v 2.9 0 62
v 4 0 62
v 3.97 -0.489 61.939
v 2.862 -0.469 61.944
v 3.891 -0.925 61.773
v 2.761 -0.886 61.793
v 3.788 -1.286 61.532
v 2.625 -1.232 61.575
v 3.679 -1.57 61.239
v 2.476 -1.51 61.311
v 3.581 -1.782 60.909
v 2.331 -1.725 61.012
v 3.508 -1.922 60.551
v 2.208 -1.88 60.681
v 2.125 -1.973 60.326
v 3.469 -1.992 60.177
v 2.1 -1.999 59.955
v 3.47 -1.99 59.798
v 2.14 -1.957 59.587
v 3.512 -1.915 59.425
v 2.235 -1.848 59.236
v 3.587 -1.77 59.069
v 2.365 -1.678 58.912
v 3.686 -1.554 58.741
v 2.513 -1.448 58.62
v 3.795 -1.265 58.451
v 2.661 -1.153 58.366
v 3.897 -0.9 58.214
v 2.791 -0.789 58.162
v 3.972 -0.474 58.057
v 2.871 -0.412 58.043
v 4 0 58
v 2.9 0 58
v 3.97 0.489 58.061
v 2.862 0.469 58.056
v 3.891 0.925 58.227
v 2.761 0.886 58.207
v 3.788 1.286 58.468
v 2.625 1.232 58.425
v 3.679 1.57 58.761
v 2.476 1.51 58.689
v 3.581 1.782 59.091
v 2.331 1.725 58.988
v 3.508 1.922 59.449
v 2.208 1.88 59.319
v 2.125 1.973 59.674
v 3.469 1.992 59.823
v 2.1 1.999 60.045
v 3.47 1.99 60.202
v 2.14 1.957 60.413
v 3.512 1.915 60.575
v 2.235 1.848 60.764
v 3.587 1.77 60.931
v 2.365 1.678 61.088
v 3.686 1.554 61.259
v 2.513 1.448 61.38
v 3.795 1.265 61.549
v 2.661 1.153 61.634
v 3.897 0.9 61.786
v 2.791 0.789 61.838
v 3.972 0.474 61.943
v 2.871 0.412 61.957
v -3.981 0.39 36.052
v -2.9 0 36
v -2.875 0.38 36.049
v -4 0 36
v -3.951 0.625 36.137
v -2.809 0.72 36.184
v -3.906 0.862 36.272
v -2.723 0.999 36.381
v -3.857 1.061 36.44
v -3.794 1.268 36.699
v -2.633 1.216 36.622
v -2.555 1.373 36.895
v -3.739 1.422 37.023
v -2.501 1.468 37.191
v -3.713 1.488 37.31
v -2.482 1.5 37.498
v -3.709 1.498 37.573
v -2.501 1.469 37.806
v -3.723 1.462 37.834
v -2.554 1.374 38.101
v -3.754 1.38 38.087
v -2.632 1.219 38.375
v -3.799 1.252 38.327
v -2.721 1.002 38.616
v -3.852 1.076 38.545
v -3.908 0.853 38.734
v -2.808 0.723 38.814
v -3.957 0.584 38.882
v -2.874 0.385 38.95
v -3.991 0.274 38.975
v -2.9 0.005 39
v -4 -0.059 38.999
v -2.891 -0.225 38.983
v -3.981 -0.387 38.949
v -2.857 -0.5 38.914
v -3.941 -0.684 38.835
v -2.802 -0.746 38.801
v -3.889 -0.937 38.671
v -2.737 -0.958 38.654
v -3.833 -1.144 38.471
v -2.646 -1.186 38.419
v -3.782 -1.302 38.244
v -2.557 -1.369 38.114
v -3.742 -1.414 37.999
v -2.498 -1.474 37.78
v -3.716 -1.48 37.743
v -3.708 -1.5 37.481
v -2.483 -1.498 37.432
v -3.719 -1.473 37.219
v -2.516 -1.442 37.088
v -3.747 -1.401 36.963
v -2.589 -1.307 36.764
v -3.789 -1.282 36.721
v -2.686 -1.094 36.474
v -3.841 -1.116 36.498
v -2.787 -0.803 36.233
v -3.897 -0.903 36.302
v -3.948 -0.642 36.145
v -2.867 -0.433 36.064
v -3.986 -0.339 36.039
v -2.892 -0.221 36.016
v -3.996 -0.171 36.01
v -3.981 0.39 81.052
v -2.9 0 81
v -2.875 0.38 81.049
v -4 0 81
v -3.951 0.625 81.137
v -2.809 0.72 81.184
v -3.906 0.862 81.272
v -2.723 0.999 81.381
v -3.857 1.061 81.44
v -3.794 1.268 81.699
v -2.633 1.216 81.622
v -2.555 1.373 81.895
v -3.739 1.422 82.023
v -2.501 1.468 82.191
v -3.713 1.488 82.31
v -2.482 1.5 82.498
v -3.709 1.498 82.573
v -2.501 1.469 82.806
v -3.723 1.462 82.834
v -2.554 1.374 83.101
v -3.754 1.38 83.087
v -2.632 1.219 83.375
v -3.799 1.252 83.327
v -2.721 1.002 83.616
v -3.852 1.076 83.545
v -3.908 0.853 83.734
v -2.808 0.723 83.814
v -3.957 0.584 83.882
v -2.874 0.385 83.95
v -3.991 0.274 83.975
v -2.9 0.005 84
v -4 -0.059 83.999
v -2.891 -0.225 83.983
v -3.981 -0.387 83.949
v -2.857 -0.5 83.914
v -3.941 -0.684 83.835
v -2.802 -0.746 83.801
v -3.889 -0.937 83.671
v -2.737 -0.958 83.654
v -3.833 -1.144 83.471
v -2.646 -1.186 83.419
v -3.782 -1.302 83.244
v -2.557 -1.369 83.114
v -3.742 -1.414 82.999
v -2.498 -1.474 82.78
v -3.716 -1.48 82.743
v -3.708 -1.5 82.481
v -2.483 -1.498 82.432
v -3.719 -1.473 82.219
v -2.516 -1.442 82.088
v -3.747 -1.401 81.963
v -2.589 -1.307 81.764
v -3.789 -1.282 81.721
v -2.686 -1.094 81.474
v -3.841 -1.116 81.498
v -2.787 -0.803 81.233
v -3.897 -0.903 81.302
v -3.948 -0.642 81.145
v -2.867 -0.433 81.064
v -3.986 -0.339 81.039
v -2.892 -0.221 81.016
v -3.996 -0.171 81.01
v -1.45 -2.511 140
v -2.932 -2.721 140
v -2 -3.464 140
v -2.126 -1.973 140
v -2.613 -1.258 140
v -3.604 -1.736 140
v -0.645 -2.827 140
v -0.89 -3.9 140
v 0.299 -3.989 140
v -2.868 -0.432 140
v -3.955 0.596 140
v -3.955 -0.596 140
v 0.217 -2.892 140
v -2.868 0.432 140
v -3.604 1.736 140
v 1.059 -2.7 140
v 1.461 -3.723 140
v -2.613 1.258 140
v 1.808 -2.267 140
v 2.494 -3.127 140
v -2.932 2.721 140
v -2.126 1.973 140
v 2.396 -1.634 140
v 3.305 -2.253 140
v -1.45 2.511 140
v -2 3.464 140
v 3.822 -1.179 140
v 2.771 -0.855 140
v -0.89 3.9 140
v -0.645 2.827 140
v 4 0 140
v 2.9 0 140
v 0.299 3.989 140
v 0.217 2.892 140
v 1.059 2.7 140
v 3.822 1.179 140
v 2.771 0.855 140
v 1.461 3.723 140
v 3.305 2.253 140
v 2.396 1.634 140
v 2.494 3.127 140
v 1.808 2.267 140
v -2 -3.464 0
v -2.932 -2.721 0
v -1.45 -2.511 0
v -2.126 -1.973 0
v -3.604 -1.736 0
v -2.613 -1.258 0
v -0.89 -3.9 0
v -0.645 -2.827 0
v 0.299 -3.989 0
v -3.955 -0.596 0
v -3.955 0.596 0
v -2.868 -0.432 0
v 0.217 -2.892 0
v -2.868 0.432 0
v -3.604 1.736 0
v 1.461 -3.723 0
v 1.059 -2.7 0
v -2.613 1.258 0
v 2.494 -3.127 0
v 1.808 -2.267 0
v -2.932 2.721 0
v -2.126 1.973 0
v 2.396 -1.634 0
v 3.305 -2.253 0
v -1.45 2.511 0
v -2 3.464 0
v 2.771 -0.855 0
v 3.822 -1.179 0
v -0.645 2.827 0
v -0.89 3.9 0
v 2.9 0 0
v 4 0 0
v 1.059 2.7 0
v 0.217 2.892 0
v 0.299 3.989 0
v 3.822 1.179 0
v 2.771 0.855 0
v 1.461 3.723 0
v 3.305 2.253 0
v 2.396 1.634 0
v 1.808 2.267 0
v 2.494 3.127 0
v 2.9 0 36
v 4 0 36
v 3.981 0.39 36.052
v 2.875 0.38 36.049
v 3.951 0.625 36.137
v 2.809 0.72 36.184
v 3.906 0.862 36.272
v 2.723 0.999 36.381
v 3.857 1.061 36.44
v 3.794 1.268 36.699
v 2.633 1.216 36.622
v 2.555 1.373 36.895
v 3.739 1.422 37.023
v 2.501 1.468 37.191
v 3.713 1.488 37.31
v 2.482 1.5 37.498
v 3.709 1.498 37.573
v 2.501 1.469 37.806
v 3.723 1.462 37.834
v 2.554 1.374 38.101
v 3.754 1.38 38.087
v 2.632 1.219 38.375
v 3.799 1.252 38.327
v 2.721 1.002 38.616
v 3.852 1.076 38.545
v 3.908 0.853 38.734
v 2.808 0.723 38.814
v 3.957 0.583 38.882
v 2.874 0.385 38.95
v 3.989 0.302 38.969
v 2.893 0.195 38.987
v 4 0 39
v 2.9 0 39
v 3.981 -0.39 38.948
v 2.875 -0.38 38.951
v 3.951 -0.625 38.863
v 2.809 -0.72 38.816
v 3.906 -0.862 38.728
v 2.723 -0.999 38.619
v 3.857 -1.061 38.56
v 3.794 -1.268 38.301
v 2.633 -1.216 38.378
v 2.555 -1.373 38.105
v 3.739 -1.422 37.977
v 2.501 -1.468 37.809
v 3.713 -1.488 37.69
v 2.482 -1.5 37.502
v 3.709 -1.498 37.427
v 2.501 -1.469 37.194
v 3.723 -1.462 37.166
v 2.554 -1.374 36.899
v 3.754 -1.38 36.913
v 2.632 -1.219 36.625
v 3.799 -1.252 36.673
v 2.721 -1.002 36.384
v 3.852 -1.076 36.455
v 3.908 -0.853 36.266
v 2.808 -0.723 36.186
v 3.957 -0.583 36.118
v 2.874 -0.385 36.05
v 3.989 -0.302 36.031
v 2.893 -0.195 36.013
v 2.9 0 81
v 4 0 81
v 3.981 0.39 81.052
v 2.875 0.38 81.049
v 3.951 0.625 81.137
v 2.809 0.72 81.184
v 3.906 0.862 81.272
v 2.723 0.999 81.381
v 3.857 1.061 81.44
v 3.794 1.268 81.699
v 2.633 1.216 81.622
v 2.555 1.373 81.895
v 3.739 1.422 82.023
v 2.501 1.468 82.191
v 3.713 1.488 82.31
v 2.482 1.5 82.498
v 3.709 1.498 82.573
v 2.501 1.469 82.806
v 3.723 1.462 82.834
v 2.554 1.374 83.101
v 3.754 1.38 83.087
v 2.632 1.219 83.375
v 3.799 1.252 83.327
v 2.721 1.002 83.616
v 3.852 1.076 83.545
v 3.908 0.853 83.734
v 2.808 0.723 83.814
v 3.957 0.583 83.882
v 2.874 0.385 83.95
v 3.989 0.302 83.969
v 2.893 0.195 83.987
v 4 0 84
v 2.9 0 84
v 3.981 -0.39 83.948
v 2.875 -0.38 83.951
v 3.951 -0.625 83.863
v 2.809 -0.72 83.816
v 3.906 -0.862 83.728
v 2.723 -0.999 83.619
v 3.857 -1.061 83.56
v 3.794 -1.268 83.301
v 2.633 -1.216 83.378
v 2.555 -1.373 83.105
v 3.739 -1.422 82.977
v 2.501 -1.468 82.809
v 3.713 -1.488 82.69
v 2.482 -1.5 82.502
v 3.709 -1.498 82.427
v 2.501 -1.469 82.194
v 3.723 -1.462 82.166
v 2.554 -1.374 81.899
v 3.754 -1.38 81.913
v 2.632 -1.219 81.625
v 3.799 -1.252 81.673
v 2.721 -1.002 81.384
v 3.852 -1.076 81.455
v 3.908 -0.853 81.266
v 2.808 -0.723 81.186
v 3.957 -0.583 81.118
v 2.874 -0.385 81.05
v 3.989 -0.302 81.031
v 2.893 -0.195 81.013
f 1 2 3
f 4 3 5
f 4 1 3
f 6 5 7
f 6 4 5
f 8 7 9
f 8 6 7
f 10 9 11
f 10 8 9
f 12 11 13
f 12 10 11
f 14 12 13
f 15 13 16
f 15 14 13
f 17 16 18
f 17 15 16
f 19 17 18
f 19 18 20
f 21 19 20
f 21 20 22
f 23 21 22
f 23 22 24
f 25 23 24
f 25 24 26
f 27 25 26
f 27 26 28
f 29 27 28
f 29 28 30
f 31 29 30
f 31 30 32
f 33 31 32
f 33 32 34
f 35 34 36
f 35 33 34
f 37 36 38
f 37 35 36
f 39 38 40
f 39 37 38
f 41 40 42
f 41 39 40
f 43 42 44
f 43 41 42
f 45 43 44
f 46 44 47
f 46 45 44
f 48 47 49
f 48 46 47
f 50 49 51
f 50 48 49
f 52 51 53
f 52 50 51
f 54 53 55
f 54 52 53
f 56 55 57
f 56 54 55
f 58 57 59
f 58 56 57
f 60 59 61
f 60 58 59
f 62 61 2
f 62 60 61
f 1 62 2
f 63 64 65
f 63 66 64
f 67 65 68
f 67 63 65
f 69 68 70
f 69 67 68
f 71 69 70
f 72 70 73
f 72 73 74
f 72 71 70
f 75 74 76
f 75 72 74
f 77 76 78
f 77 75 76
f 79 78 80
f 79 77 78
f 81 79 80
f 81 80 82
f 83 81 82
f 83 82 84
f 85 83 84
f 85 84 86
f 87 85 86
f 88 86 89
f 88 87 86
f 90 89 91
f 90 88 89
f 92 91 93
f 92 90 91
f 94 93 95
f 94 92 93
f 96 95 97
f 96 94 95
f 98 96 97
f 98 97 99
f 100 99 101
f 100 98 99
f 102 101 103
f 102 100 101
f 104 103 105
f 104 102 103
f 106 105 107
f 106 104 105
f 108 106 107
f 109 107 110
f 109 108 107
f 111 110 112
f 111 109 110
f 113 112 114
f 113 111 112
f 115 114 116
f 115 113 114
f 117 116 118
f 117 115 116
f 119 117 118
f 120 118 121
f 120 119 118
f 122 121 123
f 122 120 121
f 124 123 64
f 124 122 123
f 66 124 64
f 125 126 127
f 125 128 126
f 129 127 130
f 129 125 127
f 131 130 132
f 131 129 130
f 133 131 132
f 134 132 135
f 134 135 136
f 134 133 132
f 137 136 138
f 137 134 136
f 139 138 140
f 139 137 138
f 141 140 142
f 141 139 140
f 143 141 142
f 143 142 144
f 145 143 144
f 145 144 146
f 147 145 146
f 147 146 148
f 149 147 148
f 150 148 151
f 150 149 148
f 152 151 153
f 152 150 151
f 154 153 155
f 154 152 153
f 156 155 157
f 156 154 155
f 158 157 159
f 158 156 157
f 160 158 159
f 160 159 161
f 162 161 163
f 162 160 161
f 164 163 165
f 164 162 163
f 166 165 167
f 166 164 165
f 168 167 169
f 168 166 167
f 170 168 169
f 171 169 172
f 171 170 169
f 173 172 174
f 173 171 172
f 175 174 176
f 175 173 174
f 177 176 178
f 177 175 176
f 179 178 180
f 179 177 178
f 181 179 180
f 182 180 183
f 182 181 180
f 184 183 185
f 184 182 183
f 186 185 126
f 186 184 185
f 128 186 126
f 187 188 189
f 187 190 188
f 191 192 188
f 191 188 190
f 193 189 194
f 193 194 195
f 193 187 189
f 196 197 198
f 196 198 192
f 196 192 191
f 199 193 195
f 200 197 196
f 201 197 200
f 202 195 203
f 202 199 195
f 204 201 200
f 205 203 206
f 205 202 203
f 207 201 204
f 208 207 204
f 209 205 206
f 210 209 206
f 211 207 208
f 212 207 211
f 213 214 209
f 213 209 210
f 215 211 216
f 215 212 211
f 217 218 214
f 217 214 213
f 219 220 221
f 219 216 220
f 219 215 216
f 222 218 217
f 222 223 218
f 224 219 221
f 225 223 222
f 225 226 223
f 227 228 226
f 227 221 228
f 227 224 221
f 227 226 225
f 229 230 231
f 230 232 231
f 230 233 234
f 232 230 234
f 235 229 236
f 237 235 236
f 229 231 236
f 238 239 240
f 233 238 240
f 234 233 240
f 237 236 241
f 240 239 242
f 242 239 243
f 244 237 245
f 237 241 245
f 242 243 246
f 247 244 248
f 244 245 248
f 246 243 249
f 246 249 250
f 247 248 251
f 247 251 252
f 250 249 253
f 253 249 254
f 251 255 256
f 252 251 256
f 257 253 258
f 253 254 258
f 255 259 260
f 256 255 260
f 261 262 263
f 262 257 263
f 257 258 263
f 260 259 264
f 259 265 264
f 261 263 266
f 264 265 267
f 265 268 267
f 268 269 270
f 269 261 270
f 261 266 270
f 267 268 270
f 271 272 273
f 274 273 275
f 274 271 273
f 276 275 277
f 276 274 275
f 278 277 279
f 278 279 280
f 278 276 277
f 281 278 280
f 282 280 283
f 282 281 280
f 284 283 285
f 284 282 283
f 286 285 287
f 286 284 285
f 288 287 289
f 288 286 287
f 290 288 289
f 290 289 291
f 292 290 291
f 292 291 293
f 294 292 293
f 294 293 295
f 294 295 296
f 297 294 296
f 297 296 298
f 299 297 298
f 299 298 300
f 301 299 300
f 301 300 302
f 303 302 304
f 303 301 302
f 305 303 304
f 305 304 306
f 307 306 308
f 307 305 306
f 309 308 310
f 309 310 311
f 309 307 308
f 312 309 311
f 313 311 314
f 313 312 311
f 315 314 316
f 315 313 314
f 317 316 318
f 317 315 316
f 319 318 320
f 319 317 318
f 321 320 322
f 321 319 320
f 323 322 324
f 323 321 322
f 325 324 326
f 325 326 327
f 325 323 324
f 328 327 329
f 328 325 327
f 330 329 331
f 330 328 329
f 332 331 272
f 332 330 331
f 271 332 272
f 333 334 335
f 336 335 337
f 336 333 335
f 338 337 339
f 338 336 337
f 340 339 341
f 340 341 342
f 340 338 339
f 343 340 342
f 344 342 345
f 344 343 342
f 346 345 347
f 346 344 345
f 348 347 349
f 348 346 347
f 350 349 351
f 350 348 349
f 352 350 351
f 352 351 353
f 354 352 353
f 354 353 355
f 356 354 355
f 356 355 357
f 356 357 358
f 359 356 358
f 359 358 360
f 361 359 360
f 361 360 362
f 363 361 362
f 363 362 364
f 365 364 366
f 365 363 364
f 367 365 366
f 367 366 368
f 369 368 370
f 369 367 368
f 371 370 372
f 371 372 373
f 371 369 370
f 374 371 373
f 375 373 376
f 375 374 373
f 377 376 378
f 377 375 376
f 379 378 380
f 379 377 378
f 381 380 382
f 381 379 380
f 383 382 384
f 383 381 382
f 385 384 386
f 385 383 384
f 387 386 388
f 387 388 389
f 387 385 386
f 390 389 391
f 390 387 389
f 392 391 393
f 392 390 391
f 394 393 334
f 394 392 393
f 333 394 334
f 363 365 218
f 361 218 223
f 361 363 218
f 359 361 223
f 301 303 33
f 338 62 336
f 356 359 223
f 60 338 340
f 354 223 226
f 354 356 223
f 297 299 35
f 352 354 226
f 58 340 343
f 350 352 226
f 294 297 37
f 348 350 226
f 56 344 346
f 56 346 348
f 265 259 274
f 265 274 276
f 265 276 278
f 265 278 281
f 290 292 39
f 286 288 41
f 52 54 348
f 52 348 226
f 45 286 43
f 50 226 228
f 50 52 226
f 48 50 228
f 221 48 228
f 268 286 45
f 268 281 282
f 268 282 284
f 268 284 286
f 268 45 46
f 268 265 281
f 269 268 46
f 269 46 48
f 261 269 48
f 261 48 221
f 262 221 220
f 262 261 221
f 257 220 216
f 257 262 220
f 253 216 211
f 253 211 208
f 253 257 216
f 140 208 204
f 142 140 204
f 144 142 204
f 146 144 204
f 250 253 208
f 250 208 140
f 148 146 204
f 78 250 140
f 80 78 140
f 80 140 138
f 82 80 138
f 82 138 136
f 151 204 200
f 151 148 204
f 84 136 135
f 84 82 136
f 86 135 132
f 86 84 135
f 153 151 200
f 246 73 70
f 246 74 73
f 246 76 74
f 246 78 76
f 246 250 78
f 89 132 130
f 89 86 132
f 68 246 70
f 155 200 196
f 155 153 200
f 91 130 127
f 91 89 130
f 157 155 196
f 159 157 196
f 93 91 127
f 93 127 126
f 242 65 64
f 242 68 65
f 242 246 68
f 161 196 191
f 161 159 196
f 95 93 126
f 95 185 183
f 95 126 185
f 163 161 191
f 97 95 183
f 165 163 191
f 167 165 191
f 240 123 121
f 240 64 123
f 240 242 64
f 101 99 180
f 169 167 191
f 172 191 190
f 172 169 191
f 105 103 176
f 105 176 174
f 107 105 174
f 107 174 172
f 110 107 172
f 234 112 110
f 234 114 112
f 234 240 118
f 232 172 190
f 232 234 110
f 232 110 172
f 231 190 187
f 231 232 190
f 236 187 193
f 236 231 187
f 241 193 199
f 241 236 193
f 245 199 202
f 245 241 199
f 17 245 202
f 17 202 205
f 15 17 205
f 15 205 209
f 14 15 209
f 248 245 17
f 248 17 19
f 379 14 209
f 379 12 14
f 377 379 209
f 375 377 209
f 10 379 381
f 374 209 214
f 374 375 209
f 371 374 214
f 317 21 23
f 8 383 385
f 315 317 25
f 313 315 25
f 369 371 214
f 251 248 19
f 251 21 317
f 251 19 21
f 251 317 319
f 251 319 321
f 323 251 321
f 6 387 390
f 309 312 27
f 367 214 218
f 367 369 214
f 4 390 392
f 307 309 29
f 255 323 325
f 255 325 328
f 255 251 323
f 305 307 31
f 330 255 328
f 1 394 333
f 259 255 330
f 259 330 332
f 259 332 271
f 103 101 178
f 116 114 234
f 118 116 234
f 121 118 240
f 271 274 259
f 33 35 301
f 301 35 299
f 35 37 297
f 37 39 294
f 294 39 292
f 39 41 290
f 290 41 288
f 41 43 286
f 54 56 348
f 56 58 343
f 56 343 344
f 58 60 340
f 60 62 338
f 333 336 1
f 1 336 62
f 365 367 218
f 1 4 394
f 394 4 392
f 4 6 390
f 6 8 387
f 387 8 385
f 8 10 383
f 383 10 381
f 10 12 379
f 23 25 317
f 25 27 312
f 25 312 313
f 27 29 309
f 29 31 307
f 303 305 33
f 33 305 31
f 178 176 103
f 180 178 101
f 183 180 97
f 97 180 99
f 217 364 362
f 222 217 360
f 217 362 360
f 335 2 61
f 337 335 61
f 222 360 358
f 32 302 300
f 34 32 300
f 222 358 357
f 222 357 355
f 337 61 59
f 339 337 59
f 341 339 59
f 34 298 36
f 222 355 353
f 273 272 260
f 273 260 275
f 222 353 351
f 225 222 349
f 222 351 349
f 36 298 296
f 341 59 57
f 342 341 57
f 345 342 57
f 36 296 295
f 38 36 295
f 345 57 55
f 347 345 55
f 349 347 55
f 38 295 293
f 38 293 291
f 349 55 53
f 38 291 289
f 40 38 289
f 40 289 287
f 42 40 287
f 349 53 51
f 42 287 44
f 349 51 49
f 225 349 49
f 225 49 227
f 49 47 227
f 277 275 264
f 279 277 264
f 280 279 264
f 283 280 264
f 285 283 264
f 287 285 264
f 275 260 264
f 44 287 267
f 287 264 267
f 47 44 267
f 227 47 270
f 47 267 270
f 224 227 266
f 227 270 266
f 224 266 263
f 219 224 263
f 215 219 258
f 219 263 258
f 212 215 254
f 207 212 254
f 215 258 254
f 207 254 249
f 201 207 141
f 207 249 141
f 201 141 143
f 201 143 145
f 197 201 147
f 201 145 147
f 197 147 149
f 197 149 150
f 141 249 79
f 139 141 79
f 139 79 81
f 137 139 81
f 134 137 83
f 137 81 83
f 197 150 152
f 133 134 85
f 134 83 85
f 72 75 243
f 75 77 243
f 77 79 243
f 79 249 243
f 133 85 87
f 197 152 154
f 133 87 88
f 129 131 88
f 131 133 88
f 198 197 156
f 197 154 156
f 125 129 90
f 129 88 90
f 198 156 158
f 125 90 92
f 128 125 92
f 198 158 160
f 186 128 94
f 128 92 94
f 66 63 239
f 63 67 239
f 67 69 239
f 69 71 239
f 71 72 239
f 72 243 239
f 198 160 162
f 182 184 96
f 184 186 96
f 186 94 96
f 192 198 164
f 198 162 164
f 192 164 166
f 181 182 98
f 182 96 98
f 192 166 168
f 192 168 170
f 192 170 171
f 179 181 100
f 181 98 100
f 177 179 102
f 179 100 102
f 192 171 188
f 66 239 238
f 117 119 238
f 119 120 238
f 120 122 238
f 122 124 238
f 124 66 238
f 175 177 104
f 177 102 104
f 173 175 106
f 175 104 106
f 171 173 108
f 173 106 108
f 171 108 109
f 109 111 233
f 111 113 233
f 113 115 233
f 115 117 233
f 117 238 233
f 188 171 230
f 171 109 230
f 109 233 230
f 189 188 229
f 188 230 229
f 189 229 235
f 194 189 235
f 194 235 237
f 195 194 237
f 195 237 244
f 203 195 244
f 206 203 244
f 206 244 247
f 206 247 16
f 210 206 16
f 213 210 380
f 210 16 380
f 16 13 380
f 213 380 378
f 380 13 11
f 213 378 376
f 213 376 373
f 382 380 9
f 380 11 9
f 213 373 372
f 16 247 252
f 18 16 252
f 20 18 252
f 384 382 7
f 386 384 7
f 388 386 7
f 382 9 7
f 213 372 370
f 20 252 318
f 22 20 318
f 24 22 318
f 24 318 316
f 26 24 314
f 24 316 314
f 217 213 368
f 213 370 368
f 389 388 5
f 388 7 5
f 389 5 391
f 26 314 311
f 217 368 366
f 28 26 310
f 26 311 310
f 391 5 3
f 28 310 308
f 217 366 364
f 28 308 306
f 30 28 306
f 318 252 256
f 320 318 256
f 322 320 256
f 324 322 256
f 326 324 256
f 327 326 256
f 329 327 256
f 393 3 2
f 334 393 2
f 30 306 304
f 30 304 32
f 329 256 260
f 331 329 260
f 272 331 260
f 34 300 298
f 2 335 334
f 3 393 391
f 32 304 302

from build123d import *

# Parameters (mm, degrees)
SKETCH1_R                                  = 4
SKETCH1_R_2                                = 2.9
SHAFT_BOSS_EXTRUDE1_DEPTH                  = 140
PCB_MOUNTINGHOPLES_CUT_EXTRUDE1_DEPTH      = 8.232243507
PCB_MOUNTINGHOPLES_CUT_EXTRUDE1_DEPTH_BACK = 16
SKETCH2_R                                  = 1.5
SKETCH3_R                                  = 2
PCB_CONNECTOR_HOLE_CUT_EXTRUDE2_DEPTH      = 10


with BuildPart() as part:
    # Sketch1 → Shaft Boss-Extrude1 (new body)
    with BuildSketch(Plane.XY):
        Circle(SKETCH1_R)
        Circle(SKETCH1_R_2, mode=Mode.SUBTRACT)
    extrude(amount=SHAFT_BOSS_EXTRUDE1_DEPTH)

    # Sketch2 → PCB Mountinghoples Cut-Extrude1 (cut, two sides: drawn at the far end of the back side and taken through both)
    with BuildSketch(Plane(origin=(0, 0, 0), x_dir=(0, 0, -1), z_dir=(1, 0, 0)).offset(-PCB_MOUNTINGHOPLES_CUT_EXTRUDE1_DEPTH_BACK)):
        with Locations((-82.5, 0)):
            Circle(SKETCH2_R)
        with Locations((-37.5, 0)):
            Circle(SKETCH2_R)
    extrude(amount=PCB_MOUNTINGHOPLES_CUT_EXTRUDE1_DEPTH + PCB_MOUNTINGHOPLES_CUT_EXTRUDE1_DEPTH_BACK, mode=Mode.SUBTRACT)

    # Sketch3 → PCB COnnector Hole Cut-Extrude2 (cut)
    with BuildSketch(Plane(origin=(0, 0, 0), x_dir=(0, 0, -1), z_dir=(1, 0, 0))):
        with Locations(Location((-60, 0, 0), (0, 0, 180))):
            Circle(SKETCH3_R)
    extrude(amount=PCB_CONNECTOR_HOLE_CUT_EXTRUDE2_DEPTH, mode=Mode.SUBTRACT)


solid = part.part
